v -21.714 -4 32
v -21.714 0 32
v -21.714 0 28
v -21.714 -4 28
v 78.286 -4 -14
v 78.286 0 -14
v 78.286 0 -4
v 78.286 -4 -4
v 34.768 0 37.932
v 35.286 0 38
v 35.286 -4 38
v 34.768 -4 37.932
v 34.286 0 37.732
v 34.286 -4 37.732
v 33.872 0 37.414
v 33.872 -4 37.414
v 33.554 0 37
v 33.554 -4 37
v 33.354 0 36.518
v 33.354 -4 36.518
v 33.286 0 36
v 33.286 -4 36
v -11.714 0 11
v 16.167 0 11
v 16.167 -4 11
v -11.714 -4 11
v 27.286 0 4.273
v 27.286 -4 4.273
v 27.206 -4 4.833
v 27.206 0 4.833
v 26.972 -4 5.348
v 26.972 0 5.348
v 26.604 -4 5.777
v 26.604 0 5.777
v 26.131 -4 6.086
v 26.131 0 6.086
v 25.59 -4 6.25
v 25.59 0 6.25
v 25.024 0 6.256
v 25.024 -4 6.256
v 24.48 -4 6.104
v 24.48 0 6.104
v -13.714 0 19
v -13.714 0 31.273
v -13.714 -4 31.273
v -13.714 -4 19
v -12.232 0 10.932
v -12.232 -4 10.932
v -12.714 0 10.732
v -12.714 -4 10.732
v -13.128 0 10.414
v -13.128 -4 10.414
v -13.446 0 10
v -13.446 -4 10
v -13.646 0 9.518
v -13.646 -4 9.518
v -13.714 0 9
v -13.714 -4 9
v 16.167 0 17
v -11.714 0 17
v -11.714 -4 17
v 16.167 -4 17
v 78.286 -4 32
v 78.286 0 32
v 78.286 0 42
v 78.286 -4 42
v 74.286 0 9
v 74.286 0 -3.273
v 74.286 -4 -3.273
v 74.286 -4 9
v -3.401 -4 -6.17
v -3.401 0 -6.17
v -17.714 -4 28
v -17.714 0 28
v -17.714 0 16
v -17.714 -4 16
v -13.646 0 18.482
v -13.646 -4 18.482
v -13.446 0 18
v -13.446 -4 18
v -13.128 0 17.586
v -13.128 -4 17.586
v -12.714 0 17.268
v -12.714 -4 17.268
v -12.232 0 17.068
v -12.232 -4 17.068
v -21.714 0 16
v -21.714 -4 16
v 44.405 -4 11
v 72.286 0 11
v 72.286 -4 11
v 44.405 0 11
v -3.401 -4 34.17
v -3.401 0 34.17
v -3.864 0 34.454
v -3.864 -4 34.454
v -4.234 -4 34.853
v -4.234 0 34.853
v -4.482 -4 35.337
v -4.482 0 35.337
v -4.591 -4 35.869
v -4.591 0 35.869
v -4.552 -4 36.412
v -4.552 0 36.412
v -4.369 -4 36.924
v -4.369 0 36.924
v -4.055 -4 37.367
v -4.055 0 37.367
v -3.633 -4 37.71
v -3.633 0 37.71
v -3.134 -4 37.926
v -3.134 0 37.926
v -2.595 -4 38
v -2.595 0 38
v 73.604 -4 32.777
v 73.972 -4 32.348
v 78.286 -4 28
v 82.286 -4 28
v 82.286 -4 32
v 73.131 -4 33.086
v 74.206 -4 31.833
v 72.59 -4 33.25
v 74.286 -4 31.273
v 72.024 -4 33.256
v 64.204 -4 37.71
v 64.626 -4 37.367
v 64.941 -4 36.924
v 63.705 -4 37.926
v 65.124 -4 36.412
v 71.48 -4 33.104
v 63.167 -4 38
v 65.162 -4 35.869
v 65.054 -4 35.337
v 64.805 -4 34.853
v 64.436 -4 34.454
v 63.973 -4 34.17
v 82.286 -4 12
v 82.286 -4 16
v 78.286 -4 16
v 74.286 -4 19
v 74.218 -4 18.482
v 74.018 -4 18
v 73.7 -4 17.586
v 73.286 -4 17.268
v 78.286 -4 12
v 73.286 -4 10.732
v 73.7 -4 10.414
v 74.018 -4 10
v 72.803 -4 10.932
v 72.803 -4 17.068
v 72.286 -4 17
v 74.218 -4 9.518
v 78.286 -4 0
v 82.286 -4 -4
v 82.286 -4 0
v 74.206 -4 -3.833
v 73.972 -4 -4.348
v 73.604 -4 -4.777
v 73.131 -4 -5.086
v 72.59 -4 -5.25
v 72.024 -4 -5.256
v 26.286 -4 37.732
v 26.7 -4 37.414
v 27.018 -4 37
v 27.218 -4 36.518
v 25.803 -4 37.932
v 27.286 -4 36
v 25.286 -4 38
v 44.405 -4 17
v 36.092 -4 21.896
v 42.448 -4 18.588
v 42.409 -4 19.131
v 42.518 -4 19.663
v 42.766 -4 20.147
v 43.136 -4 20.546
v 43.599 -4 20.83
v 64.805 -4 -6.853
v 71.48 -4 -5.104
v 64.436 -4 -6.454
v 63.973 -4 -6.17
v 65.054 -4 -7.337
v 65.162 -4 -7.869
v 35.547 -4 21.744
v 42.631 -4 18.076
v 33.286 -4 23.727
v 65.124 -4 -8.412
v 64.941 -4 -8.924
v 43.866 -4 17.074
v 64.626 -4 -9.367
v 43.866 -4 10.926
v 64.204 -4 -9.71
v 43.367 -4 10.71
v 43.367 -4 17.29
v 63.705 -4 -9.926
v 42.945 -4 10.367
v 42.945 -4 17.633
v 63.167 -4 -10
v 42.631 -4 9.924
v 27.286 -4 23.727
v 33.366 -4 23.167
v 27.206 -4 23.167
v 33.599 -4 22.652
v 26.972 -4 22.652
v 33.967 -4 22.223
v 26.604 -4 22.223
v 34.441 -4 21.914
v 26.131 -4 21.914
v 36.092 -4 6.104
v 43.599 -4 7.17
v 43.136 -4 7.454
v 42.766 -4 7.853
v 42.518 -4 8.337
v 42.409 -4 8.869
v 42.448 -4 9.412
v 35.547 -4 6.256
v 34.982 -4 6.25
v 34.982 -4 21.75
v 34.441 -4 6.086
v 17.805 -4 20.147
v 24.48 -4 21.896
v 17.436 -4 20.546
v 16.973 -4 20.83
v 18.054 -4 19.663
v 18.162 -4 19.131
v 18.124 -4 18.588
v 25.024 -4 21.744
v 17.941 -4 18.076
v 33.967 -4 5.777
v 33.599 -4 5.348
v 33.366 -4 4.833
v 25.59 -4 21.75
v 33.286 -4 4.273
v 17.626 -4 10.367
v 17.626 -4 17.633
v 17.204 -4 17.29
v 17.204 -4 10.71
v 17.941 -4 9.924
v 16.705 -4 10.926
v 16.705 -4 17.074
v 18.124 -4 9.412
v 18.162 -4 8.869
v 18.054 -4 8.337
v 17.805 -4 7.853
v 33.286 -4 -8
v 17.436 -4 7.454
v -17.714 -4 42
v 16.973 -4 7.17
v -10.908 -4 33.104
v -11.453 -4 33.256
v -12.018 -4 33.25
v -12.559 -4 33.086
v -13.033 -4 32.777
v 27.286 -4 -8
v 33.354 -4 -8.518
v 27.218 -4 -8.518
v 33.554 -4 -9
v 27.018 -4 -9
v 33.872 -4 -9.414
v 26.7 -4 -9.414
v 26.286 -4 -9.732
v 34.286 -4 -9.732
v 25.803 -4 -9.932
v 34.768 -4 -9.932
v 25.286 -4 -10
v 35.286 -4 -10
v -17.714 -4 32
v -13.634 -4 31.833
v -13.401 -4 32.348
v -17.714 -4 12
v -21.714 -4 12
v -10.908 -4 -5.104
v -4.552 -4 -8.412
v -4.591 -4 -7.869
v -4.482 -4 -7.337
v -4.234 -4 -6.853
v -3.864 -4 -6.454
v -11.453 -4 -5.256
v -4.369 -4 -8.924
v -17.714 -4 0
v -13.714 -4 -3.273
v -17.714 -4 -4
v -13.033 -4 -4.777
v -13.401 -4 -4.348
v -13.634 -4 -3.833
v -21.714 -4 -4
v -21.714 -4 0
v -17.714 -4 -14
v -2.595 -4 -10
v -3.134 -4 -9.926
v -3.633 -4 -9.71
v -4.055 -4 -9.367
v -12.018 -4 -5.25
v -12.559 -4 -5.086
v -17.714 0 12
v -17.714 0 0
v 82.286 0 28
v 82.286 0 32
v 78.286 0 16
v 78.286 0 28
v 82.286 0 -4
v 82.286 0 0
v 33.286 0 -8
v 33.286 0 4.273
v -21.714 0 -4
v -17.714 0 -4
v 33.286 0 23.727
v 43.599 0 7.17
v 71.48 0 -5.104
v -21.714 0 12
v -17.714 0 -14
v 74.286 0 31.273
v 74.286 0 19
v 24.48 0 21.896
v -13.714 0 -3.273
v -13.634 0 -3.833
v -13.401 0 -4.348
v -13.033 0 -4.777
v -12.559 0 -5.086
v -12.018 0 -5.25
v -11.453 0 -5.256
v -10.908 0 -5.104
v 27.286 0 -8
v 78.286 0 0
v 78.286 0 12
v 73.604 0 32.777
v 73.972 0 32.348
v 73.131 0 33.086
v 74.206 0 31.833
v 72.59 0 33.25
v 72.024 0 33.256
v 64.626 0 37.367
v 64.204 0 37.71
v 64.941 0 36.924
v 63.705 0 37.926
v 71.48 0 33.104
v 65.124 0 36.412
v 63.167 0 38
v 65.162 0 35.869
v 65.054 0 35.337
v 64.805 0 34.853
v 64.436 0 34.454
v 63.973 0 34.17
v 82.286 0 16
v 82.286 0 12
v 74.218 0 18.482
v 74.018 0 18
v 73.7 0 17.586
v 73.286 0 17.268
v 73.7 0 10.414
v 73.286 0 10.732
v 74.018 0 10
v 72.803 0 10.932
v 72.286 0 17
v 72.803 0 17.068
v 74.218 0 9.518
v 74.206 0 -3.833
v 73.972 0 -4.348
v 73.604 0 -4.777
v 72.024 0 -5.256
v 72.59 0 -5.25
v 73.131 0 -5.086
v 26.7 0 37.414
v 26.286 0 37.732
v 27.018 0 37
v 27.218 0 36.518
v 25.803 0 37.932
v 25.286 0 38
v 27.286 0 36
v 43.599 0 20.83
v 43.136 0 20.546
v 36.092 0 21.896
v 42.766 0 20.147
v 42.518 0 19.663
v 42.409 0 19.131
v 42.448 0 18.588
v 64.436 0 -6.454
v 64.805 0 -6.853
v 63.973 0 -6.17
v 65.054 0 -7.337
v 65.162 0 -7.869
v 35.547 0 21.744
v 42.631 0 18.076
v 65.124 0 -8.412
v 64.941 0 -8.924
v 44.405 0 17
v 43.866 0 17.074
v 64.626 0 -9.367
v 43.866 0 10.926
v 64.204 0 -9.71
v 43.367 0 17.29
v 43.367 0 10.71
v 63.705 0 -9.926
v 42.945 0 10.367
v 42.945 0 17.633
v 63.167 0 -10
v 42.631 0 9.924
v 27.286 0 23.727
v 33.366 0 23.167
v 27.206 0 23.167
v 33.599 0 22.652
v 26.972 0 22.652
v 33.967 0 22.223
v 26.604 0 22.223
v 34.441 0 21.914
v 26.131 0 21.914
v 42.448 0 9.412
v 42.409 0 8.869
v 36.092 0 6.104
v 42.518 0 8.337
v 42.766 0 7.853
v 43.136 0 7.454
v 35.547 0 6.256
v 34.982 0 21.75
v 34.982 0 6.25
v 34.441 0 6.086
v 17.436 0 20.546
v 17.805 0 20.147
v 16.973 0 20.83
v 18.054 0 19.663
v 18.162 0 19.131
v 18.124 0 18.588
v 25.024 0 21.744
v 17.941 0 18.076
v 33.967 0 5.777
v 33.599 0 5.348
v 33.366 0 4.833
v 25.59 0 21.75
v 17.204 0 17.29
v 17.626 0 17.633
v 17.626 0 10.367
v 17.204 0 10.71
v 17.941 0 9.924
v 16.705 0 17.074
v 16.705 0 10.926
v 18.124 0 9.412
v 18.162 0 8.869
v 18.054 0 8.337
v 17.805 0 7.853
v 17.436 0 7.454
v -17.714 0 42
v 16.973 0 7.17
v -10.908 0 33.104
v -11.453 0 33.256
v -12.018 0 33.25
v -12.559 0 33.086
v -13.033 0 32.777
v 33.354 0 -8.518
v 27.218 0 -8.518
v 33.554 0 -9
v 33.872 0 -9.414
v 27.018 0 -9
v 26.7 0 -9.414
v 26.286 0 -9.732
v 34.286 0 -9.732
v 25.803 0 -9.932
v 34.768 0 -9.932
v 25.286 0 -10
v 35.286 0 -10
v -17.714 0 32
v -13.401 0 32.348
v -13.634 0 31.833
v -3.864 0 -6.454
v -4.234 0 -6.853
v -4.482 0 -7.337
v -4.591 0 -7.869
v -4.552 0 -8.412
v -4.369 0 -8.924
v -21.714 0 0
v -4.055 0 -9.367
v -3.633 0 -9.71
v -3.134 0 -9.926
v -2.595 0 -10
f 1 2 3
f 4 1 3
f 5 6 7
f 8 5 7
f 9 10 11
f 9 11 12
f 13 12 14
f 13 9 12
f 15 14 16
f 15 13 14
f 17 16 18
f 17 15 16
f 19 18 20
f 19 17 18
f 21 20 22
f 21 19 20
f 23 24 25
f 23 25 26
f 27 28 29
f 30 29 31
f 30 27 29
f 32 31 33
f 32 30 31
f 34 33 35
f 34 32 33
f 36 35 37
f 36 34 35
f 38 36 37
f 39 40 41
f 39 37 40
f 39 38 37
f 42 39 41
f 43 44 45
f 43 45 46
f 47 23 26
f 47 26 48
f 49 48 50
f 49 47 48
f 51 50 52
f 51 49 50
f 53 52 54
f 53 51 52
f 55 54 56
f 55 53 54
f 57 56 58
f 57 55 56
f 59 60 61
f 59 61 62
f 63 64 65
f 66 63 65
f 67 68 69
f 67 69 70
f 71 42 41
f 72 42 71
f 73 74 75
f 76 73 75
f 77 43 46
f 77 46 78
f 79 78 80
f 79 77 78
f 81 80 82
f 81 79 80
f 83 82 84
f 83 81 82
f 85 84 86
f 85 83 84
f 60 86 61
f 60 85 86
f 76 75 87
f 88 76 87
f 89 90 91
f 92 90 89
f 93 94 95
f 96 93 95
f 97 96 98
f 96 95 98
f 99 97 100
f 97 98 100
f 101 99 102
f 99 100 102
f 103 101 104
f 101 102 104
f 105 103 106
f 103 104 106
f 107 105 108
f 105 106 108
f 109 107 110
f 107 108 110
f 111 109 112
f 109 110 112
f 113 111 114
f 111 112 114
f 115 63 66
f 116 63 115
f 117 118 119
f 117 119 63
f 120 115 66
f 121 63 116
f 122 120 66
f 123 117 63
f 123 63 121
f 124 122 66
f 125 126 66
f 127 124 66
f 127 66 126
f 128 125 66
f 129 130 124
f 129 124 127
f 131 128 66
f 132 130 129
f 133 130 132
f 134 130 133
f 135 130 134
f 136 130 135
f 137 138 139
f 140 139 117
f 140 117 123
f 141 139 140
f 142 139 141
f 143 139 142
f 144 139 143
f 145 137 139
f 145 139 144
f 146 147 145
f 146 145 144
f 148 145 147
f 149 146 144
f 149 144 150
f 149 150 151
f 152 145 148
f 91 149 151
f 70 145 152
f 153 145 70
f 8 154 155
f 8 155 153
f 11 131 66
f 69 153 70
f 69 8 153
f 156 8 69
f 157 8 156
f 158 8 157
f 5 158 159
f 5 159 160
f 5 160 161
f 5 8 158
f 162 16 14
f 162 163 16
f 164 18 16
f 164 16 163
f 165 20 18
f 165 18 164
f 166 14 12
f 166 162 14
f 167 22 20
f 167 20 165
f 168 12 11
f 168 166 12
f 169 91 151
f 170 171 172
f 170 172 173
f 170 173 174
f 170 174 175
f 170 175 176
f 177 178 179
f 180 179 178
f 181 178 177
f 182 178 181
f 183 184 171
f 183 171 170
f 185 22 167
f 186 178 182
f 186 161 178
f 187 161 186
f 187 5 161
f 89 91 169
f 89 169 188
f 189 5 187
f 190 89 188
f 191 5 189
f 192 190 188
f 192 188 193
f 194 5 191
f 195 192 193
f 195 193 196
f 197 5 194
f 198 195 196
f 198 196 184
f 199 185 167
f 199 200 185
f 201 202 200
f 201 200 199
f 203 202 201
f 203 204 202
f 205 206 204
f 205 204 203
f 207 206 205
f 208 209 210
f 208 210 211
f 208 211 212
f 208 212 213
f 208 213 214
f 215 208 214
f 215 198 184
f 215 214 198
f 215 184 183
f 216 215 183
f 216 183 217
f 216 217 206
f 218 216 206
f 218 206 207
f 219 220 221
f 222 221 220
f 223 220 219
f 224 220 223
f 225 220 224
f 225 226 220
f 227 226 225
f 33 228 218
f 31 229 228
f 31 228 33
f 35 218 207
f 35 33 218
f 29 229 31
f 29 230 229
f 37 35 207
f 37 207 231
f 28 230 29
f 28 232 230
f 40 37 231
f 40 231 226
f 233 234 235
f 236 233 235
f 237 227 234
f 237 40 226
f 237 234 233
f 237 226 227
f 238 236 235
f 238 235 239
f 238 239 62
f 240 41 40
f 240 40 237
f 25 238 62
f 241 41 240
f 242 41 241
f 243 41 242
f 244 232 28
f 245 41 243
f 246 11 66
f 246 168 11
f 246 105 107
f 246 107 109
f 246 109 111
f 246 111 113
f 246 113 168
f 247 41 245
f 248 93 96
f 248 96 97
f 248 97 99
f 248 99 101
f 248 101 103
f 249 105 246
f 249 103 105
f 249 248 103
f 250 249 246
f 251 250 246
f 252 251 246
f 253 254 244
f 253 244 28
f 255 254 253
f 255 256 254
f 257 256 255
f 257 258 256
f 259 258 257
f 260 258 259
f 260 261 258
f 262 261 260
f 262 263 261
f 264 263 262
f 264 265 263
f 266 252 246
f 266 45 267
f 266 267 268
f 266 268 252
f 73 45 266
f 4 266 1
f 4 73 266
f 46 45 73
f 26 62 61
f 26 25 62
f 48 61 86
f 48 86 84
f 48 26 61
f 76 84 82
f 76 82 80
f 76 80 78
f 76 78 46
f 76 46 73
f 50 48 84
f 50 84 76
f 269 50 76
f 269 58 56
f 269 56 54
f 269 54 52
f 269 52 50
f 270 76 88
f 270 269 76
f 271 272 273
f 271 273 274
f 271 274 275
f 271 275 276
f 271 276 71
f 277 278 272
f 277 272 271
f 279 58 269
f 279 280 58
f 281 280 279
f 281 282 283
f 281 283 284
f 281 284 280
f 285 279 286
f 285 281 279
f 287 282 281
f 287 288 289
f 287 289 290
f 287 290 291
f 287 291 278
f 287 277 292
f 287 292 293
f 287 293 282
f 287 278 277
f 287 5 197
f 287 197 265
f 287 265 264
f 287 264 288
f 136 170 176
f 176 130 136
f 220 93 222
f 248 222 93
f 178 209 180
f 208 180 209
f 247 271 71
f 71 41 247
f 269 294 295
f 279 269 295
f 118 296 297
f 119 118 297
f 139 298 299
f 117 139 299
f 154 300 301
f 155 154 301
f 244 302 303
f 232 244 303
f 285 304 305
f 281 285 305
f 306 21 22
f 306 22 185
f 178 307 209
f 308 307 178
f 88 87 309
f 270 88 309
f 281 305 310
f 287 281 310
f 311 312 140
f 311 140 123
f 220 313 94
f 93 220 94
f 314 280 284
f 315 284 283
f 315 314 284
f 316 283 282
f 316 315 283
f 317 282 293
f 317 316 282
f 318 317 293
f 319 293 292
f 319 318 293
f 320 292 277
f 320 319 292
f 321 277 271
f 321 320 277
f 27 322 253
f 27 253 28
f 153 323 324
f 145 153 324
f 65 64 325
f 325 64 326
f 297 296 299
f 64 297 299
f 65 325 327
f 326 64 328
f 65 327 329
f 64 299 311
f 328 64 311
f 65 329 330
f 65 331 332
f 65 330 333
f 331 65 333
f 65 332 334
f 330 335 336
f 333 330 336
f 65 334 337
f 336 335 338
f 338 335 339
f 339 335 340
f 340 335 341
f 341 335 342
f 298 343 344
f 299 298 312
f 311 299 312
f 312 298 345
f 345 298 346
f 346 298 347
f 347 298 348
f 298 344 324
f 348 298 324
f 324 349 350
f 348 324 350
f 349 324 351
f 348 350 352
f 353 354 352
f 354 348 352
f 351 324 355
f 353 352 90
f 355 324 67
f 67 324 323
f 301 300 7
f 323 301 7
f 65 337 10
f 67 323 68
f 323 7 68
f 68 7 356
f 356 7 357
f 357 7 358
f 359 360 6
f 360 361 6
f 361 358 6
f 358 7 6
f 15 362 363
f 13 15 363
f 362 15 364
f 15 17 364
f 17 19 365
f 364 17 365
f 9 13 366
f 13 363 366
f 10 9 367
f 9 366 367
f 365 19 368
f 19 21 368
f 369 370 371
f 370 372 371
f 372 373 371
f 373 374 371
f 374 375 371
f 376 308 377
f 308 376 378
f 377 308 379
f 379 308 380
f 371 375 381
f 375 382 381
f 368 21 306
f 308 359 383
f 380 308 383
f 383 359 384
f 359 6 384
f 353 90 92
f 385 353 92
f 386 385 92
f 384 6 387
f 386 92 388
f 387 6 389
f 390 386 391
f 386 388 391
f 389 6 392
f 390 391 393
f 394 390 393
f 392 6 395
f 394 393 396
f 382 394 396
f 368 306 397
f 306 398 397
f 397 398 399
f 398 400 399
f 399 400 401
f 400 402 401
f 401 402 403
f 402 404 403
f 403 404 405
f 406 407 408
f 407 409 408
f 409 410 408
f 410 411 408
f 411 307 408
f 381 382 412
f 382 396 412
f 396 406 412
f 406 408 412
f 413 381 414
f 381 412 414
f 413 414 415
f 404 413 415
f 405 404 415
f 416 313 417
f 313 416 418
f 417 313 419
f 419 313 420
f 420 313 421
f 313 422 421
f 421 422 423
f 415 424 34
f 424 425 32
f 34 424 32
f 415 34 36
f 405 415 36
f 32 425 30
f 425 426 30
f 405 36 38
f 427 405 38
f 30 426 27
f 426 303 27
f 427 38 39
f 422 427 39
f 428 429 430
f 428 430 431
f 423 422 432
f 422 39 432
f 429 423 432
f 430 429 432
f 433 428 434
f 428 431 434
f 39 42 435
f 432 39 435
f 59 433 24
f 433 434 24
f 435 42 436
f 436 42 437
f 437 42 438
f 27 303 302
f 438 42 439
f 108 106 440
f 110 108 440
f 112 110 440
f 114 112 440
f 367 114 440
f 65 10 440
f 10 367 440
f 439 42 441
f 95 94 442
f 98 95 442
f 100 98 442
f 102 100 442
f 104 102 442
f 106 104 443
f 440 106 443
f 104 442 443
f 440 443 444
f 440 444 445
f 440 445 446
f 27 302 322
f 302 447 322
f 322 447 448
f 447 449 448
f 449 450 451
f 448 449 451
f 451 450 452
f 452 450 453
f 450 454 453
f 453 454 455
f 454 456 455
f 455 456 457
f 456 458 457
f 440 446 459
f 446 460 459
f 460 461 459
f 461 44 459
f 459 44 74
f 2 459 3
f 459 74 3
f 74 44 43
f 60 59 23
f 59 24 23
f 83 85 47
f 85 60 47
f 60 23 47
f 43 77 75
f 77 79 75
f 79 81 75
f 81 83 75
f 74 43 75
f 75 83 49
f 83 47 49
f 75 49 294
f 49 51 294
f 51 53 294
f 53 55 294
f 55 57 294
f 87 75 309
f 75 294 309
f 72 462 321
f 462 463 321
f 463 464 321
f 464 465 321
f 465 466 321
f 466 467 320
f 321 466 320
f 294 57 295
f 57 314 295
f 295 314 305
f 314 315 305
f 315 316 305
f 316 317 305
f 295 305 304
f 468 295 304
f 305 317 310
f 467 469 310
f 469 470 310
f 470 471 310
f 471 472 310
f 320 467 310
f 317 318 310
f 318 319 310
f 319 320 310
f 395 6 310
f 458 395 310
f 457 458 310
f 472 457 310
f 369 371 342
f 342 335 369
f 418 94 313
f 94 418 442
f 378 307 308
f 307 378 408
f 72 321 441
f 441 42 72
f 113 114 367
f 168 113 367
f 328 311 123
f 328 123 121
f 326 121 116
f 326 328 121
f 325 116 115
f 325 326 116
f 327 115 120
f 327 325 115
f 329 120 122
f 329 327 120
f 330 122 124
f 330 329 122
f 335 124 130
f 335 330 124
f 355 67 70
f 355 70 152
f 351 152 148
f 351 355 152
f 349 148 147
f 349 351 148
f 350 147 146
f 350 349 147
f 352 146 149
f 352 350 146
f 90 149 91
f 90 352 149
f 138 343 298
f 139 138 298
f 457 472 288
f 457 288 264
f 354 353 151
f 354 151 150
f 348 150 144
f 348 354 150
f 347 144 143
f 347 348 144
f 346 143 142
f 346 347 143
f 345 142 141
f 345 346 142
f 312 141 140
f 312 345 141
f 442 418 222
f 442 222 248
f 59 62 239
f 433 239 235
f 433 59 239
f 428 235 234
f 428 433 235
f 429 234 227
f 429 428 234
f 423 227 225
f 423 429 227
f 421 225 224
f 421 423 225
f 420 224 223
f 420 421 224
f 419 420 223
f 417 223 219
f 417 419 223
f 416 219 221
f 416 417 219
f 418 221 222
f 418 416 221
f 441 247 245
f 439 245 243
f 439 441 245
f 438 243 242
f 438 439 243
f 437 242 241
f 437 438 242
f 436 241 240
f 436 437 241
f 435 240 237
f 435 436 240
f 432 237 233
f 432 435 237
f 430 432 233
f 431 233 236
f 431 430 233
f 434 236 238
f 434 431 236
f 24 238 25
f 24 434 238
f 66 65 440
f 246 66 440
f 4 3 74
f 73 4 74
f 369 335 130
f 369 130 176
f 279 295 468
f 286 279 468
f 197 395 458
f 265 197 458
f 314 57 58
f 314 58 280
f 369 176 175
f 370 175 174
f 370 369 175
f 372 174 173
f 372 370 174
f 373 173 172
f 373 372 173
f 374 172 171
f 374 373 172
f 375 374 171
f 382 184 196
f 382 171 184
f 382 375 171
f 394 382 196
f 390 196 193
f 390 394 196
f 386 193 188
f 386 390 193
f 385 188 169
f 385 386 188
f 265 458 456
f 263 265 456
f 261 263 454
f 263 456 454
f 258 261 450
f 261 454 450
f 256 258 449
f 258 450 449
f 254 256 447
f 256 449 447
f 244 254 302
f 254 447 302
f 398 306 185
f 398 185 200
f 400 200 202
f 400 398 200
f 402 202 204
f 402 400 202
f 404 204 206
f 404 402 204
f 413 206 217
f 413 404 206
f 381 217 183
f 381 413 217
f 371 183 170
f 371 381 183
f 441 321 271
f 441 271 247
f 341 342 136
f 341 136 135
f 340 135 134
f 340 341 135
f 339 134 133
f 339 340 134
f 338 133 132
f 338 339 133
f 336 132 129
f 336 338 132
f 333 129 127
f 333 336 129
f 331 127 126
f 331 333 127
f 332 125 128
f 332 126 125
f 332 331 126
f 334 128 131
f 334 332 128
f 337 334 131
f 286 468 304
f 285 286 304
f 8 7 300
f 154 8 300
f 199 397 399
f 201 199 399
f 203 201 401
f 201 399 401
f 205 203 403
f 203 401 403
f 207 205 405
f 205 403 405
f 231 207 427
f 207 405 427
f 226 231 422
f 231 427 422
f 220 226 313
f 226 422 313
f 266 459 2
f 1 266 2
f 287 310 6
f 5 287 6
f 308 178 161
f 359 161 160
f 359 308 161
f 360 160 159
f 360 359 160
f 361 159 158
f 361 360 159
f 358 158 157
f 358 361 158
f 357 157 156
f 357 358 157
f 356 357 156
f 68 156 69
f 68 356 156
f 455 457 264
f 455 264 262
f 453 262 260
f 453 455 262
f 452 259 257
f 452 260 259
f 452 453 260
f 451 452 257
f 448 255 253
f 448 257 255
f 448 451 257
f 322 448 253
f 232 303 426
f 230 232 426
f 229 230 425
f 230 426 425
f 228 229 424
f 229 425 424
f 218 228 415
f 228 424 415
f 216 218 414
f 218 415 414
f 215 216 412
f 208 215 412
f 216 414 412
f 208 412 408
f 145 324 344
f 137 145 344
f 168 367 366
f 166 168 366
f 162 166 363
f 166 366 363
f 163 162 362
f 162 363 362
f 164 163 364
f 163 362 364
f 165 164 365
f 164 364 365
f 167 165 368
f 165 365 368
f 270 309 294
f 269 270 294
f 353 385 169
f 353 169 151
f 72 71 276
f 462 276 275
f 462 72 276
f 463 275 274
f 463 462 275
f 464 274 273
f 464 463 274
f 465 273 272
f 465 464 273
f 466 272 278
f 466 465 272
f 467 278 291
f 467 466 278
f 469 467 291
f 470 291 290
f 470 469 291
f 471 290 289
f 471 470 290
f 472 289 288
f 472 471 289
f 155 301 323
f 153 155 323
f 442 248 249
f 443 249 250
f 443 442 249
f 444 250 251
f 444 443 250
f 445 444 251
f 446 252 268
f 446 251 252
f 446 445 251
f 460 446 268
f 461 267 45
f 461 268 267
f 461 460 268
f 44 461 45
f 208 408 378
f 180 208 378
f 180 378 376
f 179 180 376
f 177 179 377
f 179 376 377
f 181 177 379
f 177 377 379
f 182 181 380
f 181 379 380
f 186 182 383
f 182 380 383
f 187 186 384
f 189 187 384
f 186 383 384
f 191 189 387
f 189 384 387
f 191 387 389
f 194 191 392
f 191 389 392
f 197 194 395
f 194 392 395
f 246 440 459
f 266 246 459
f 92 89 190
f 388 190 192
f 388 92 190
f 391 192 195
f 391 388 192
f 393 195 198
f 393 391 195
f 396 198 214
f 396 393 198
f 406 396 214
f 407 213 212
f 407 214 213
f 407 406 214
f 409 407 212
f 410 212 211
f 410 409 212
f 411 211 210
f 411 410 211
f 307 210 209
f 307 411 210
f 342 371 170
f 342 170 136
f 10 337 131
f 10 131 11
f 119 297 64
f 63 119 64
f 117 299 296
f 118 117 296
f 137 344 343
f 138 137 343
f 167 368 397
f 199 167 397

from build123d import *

# Parameters (mm, degrees)
BOSS_EXTRUDE1_DEPTH = 4
CUT_EXTRUDE1_DEPTH  = 10


with BuildPart() as part:
    # Sketch1 → Boss-Extrude1 (new body)
    with BuildSketch(Plane(origin=(0, 0, 0), x_dir=(1, 0, 0), z_dir=(0, 1, 0))):
        Polygon((-17.714285714, -42), (-17.714285714, -32), (-21.714285714, -32), (-21.714285714, -28), (-17.714285714, -28), (-17.714285714, -16), (-21.714285714, -16), (-21.714285714, -12), (-17.714285714, -12), (-17.714285714, 0), (-21.714285714, 0), (-21.714285714, 4), (-17.714285714, 4), (-17.714285714, 14), (78.285714286, 14), (78.285714286, 4), (82.285714286, 4), (82.285714286, 0), (78.285714286, 0), (78.285714286, -12), (82.285714286, -12), (82.285714286, -16), (78.285714286, -16), (78.285714286, -28), (82.285714286, -28), (82.285714286, -32), (78.285714286, -32), (78.285714286, -42), align=None)
    extrude(amount=-BOSS_EXTRUDE1_DEPTH)

    # Sketch2 → Cut-Extrude1 (cut)
    with BuildSketch(Plane(origin=(0, 0, 0), x_dir=(1, 0, 0), z_dir=(0, 1, 0))):
        with BuildLine():
            Line((-2.595319649, 10), (25.285714286, 10))
            ThreePointArc((25.285714286, 10), (26.699927848, 9.414213562), (27.285714286, 8))
            Line((27.285714286, 8), (27.285714286, -4.273399853))
            ThreePointArc((27.285714286, -4.273399853), (26.378511973, -5.948450065), (24.479921071, -6.103890851))
            Line((24.479921071, -6.103890851), (-3.401112863, 6.169509001))
            ThreePointArc((-3.401112863, 6.169509001), (-4.552483668, 8.411714709), (-2.595319649, 10))
        make_face()
        with BuildLine():
            ThreePointArc((-13.714285714, 3.273399853), (-12.807083402, 4.948450065), (-10.9084925, 5.103890851))
            Line((-10.9084925, 5.103890851), (16.972541435, -7.169509001))
            ThreePointArc((16.972541435, -7.169509001), (18.12391224, -9.411714709), (16.16674822, -11))
            Line((16.16674822, -11), (-11.714285714, -11))
            ThreePointArc((-11.714285714, -11), (-13.128499277, -10.414213562), (-13.714285714, -9))
            Line((-13.714285714, -9), (-13.714285714, 3.273399853))
        make_face()
        with BuildLine():
            Line((33.285714286, 8), (33.285714286, -4.273399853))
            ThreePointArc((33.285714286, -4.273399853), (34.192916598, -5.948450065), (36.0915075, -6.103890851))
            Line((36.0915075, -6.103890851), (63.972541435, 6.169509001))
            ThreePointArc((63.972541435, 6.169509001), (65.12391224, 8.411714709), (63.16674822, 10))
            Line((63.16674822, 10), (35.285714286, 10))
            ThreePointArc((35.285714286, 10), (33.871500723, 9.414213562), (33.285714286, 8))
        make_face()
        with BuildLine():
            ThreePointArc((74.285714286, -9), (73.699927848, -10.414213562), (72.285714286, -11))
            Line((72.285714286, -11), (44.404680351, -11))
            ThreePointArc((44.404680351, -11), (42.447516332, -9.411714709), (43.598887137, -7.169509001))
            Line((43.598887137, -7.169509001), (71.479921071, 5.103890851))
            ThreePointArc((71.479921071, 5.103890851), (73.378511973, 4.948450065), (74.285714286, 3.273399853))
            Line((74.285714286, 3.273399853), (74.285714286, -9))
        make_face()
        with BuildLine():
            ThreePointArc((74.285714286, -31.273399853), (73.378511973, -32.948450065), (71.479921071, -33.103890851))
            Line((71.479921071, -33.103890851), (43.598887137, -20.830490999))
            ThreePointArc((43.598887137, -20.830490999), (42.447516332, -18.588285291), (44.404680351, -17))
            Line((44.404680351, -17), (72.285714286, -17))
            ThreePointArc((72.285714286, -17), (73.699927848, -17.585786438), (74.285714286, -19))
            Line((74.285714286, -19), (74.285714286, -31.273399853))
        make_face()
        with BuildLine():
            Line((63.16674822, -38), (35.285714286, -38))
            ThreePointArc((35.285714286, -38), (33.871500723, -37.414213562), (33.285714286, -36))
            Line((33.285714286, -36), (33.285714286, -23.726600147))
            ThreePointArc((33.285714286, -23.726600147), (34.192916598, -22.051549935), (36.0915075, -21.896109149))
            Line((36.0915075, -21.896109149), (63.972541435, -34.169509001))
            ThreePointArc((63.972541435, -34.169509001), (65.12391224, -36.411714709), (63.16674822, -38))
        make_face()
        with BuildLine():
            Line((27.285714286, -36), (27.285714286, -23.726600147))
            ThreePointArc((27.285714286, -23.726600147), (26.378511973, -22.051549935), (24.479921071, -21.896109149))
            Line((24.479921071, -21.896109149), (-3.401112863, -34.169509001))
            ThreePointArc((-3.401112863, -34.169509001), (-4.552483668, -36.411714709), (-2.595319649, -38))
            Line((-2.595319649, -38), (25.285714286, -38))
            ThreePointArc((25.285714286, -38), (26.699927848, -37.414213562), (27.285714286, -36))
        make_face()
        with BuildLine():
            ThreePointArc((-13.714285714, -19), (-13.128499277, -17.585786438), (-11.714285714, -17))
            Line((-11.714285714, -17), (16.16674822, -17))
            ThreePointArc((16.16674822, -17), (18.12391224, -18.588285291), (16.972541435, -20.830490999))
            Line((16.972541435, -20.830490999), (-10.9084925, -33.103890851))
            ThreePointArc((-10.9084925, -33.103890851), (-12.807083402, -32.948450065), (-13.714285714, -31.273399853))
            Line((-13.714285714, -31.273399853), (-13.714285714, -19))
        make_face()
    extrude(amount=-CUT_EXTRUDE1_DEPTH, mode=Mode.SUBTRACT)


solid = part.part
